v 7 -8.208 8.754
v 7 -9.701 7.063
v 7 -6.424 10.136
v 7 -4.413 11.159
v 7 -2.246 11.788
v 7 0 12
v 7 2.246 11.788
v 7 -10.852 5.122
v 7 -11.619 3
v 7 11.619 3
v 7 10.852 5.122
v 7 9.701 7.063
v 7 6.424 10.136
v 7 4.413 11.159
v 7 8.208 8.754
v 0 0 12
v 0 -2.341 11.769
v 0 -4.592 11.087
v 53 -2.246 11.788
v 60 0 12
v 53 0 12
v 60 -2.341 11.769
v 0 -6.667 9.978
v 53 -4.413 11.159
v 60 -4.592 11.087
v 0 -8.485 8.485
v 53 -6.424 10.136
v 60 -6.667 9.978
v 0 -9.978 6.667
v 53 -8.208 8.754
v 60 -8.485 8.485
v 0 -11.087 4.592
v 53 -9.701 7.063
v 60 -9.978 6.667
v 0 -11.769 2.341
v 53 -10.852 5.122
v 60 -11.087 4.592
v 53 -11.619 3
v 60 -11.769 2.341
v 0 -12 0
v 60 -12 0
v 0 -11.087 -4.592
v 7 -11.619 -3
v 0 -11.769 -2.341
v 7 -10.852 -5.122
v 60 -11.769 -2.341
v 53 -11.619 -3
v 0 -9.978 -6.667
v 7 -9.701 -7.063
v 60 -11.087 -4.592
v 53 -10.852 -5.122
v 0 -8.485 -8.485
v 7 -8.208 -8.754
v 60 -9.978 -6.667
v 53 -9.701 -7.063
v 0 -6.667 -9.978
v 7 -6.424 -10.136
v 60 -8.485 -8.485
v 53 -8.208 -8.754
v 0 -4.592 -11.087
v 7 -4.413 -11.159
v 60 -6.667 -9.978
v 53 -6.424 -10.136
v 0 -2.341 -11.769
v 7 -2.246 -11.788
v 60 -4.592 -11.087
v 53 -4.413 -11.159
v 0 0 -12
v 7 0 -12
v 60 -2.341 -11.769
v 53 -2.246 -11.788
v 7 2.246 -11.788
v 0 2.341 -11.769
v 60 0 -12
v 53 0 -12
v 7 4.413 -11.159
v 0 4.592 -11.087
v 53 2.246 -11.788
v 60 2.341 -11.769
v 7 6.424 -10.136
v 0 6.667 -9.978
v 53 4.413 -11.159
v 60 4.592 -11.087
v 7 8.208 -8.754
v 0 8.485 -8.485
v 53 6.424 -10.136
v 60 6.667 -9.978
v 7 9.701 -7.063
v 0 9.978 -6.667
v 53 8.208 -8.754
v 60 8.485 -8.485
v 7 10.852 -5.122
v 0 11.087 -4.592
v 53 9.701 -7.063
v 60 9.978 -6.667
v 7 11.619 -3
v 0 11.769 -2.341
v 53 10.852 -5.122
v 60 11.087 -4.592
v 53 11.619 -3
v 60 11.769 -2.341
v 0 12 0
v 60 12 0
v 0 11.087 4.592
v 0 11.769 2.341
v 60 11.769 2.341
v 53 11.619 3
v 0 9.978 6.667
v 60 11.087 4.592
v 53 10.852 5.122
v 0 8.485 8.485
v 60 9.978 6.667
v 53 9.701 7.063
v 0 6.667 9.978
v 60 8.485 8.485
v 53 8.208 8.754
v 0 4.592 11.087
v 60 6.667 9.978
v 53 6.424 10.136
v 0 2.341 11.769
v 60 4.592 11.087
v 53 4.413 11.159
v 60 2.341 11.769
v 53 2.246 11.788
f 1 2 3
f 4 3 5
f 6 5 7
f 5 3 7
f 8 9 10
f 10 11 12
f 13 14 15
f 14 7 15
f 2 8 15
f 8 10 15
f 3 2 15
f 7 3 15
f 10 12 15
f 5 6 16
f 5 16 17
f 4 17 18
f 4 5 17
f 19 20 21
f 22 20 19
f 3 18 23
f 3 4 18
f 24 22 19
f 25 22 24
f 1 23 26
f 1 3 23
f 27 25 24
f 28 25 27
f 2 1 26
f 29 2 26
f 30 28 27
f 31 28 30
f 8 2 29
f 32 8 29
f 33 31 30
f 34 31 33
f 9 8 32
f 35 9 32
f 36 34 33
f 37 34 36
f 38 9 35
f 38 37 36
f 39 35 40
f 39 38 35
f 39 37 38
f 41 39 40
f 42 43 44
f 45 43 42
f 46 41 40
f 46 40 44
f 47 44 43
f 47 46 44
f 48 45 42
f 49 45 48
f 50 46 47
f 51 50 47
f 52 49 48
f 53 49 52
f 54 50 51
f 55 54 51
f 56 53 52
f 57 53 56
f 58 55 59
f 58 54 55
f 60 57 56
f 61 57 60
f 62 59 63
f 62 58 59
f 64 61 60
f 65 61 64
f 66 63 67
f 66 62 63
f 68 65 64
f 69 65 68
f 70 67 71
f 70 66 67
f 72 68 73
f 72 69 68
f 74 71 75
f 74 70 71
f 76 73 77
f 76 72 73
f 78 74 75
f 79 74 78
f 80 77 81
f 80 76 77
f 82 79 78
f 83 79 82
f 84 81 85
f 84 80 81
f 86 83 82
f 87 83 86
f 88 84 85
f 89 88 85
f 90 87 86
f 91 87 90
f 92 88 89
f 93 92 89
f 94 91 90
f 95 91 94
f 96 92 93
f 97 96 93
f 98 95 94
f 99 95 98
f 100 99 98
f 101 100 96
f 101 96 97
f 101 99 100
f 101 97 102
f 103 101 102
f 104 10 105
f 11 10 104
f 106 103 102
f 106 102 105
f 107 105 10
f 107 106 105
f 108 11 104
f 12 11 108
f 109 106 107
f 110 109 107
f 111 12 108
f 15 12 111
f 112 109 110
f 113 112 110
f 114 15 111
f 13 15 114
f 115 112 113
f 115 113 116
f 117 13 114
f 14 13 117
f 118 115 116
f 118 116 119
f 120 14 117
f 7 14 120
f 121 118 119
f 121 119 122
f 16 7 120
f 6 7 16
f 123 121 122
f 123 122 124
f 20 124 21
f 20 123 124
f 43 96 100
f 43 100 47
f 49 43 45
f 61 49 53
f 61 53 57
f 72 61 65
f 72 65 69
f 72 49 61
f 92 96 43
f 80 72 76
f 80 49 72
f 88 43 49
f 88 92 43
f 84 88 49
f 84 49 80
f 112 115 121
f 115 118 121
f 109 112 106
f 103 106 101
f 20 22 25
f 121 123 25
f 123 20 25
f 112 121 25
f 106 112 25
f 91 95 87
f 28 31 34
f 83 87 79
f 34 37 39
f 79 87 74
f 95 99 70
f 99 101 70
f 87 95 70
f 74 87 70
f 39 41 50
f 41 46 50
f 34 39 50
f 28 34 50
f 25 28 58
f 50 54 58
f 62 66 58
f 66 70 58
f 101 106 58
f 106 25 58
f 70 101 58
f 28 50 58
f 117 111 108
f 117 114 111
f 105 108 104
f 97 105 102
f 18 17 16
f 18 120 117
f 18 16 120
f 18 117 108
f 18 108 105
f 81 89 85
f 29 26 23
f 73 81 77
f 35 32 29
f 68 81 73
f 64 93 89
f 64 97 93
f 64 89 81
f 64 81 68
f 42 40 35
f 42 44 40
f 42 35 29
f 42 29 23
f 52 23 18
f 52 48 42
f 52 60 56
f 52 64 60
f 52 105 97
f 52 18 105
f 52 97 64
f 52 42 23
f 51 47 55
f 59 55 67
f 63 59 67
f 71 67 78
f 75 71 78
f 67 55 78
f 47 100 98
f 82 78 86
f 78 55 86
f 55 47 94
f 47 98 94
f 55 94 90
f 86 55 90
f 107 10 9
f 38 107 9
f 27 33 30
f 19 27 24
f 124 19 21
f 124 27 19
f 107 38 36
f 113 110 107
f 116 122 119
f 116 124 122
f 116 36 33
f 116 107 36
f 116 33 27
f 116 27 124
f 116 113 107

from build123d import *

# Parameters (mm, degrees)
SKETCH_1_W          = 60
SKETCH_1_H          = 12
CUT_EXTRUDE_2_DEPTH = 23


with BuildPart() as part:
    # Эскиз1 → Повернуть1 (revolve)
    with BuildSketch(Plane.XY, mode=Mode.PRIVATE) as revolve_1_sk:
        with Locations((30, 6)):
            Rectangle(SKETCH_1_W, SKETCH_1_H)
    revolve(revolve_1_sk.sketch.rotate(Axis((0, 0, 0), (1, 0, 0)), 90), axis=Axis((0, 0, 0), (1, 0, 0)))

    # Эскиз2 → Вырез-Вытянуть2 (cut, symmetric)
    with BuildSketch(Plane.ZY.offset(-30)):
        Polygon((3, 77.578035125), (3, 11.618950039), (3, -11.618950039), (3, -77.578035125), (134.918170173, -77.578035125), (134.918170173, 77.578035125), align=None)
    cut_extrude_2 = extrude(amount=CUT_EXTRUDE_2_DEPTH, both=True, mode=Mode.SUBTRACT)

    # Зеркальное отражение1: Вырез-Вытянуть2 across plane
    add(cut_extrude_2.mirror(Plane.XY), mode=Mode.SUBTRACT)


solid = part.part
